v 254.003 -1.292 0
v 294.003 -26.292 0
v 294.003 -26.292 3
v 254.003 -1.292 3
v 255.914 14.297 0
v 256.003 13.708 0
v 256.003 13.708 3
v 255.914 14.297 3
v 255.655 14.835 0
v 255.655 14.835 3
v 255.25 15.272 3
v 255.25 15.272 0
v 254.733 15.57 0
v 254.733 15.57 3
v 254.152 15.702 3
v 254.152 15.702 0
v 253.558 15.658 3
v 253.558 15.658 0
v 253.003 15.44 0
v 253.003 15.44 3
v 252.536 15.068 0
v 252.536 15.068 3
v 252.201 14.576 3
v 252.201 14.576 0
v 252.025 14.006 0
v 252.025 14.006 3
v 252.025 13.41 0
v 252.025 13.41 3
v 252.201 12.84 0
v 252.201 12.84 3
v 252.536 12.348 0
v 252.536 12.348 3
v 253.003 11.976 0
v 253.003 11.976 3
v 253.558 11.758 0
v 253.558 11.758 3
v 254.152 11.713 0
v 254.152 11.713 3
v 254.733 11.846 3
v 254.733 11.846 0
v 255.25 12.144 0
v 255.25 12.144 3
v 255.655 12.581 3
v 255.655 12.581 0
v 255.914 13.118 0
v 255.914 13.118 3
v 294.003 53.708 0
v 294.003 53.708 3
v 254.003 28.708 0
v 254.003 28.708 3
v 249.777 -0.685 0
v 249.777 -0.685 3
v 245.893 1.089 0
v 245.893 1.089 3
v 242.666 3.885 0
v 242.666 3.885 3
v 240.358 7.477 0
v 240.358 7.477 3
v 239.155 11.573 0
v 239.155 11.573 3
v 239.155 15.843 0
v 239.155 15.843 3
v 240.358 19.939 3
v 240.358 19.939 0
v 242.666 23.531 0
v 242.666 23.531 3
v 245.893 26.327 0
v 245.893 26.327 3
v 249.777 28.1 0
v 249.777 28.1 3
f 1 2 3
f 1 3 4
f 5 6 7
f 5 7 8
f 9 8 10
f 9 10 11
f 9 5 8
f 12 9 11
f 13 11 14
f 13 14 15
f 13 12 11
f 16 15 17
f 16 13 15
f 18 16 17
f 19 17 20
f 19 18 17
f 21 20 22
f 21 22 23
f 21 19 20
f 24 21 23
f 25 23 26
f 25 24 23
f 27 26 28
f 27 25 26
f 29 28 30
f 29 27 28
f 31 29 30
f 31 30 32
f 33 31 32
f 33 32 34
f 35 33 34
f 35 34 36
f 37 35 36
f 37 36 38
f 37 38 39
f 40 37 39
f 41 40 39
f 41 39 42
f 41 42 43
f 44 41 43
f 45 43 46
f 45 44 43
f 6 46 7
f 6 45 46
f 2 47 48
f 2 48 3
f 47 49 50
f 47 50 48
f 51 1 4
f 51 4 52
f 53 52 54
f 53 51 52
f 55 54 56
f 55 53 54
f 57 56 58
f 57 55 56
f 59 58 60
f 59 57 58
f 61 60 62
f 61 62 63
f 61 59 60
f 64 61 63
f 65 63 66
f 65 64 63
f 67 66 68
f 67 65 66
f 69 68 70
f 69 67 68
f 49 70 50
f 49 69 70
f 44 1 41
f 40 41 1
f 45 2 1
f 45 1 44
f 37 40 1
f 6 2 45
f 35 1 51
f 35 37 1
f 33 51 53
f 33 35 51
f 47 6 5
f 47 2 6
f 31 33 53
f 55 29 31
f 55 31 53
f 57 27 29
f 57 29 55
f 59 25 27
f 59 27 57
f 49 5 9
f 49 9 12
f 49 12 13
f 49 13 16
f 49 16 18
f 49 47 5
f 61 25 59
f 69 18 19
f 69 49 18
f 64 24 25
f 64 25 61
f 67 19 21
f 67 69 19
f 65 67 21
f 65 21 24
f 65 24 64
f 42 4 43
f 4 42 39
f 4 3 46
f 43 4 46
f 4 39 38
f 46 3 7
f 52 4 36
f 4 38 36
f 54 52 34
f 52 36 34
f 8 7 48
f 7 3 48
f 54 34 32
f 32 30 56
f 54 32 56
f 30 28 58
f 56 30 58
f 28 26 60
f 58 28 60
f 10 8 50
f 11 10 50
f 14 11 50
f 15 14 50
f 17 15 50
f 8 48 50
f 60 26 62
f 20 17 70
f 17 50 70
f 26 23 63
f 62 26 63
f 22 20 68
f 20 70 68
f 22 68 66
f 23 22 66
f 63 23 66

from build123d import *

# Parameters (mm, degrees)
SKETCH_1_R      = 2
EXTRUDE_1_DEPTH = 3


with BuildPart() as part:
    # 草图1 → 凸台-拉伸1 (new body)
    with BuildSketch(Plane.XY):
        with BuildLine():
            Line((254.002581869, 28.707860978), (294.002581869, 53.707860978))
            Line((294.002581869, 53.707860978), (294.002581869, 13.707860978))
            Line((294.002581869, 13.707860978), (294.002581869, -26.292139022))
            Line((294.002581869, -26.292139022), (254.002581869, -1.292139022))
            ThreePointArc((254.002581869, -1.292139022), (239.002581869, 13.707860978), (254.002581869, 28.707860978))
        make_face()
        with Locations((254.002581869, 13.707860978)):
            Circle(SKETCH_1_R, mode=Mode.SUBTRACT)
    extrude(amount=EXTRUDE_1_DEPTH)


solid = part.part
